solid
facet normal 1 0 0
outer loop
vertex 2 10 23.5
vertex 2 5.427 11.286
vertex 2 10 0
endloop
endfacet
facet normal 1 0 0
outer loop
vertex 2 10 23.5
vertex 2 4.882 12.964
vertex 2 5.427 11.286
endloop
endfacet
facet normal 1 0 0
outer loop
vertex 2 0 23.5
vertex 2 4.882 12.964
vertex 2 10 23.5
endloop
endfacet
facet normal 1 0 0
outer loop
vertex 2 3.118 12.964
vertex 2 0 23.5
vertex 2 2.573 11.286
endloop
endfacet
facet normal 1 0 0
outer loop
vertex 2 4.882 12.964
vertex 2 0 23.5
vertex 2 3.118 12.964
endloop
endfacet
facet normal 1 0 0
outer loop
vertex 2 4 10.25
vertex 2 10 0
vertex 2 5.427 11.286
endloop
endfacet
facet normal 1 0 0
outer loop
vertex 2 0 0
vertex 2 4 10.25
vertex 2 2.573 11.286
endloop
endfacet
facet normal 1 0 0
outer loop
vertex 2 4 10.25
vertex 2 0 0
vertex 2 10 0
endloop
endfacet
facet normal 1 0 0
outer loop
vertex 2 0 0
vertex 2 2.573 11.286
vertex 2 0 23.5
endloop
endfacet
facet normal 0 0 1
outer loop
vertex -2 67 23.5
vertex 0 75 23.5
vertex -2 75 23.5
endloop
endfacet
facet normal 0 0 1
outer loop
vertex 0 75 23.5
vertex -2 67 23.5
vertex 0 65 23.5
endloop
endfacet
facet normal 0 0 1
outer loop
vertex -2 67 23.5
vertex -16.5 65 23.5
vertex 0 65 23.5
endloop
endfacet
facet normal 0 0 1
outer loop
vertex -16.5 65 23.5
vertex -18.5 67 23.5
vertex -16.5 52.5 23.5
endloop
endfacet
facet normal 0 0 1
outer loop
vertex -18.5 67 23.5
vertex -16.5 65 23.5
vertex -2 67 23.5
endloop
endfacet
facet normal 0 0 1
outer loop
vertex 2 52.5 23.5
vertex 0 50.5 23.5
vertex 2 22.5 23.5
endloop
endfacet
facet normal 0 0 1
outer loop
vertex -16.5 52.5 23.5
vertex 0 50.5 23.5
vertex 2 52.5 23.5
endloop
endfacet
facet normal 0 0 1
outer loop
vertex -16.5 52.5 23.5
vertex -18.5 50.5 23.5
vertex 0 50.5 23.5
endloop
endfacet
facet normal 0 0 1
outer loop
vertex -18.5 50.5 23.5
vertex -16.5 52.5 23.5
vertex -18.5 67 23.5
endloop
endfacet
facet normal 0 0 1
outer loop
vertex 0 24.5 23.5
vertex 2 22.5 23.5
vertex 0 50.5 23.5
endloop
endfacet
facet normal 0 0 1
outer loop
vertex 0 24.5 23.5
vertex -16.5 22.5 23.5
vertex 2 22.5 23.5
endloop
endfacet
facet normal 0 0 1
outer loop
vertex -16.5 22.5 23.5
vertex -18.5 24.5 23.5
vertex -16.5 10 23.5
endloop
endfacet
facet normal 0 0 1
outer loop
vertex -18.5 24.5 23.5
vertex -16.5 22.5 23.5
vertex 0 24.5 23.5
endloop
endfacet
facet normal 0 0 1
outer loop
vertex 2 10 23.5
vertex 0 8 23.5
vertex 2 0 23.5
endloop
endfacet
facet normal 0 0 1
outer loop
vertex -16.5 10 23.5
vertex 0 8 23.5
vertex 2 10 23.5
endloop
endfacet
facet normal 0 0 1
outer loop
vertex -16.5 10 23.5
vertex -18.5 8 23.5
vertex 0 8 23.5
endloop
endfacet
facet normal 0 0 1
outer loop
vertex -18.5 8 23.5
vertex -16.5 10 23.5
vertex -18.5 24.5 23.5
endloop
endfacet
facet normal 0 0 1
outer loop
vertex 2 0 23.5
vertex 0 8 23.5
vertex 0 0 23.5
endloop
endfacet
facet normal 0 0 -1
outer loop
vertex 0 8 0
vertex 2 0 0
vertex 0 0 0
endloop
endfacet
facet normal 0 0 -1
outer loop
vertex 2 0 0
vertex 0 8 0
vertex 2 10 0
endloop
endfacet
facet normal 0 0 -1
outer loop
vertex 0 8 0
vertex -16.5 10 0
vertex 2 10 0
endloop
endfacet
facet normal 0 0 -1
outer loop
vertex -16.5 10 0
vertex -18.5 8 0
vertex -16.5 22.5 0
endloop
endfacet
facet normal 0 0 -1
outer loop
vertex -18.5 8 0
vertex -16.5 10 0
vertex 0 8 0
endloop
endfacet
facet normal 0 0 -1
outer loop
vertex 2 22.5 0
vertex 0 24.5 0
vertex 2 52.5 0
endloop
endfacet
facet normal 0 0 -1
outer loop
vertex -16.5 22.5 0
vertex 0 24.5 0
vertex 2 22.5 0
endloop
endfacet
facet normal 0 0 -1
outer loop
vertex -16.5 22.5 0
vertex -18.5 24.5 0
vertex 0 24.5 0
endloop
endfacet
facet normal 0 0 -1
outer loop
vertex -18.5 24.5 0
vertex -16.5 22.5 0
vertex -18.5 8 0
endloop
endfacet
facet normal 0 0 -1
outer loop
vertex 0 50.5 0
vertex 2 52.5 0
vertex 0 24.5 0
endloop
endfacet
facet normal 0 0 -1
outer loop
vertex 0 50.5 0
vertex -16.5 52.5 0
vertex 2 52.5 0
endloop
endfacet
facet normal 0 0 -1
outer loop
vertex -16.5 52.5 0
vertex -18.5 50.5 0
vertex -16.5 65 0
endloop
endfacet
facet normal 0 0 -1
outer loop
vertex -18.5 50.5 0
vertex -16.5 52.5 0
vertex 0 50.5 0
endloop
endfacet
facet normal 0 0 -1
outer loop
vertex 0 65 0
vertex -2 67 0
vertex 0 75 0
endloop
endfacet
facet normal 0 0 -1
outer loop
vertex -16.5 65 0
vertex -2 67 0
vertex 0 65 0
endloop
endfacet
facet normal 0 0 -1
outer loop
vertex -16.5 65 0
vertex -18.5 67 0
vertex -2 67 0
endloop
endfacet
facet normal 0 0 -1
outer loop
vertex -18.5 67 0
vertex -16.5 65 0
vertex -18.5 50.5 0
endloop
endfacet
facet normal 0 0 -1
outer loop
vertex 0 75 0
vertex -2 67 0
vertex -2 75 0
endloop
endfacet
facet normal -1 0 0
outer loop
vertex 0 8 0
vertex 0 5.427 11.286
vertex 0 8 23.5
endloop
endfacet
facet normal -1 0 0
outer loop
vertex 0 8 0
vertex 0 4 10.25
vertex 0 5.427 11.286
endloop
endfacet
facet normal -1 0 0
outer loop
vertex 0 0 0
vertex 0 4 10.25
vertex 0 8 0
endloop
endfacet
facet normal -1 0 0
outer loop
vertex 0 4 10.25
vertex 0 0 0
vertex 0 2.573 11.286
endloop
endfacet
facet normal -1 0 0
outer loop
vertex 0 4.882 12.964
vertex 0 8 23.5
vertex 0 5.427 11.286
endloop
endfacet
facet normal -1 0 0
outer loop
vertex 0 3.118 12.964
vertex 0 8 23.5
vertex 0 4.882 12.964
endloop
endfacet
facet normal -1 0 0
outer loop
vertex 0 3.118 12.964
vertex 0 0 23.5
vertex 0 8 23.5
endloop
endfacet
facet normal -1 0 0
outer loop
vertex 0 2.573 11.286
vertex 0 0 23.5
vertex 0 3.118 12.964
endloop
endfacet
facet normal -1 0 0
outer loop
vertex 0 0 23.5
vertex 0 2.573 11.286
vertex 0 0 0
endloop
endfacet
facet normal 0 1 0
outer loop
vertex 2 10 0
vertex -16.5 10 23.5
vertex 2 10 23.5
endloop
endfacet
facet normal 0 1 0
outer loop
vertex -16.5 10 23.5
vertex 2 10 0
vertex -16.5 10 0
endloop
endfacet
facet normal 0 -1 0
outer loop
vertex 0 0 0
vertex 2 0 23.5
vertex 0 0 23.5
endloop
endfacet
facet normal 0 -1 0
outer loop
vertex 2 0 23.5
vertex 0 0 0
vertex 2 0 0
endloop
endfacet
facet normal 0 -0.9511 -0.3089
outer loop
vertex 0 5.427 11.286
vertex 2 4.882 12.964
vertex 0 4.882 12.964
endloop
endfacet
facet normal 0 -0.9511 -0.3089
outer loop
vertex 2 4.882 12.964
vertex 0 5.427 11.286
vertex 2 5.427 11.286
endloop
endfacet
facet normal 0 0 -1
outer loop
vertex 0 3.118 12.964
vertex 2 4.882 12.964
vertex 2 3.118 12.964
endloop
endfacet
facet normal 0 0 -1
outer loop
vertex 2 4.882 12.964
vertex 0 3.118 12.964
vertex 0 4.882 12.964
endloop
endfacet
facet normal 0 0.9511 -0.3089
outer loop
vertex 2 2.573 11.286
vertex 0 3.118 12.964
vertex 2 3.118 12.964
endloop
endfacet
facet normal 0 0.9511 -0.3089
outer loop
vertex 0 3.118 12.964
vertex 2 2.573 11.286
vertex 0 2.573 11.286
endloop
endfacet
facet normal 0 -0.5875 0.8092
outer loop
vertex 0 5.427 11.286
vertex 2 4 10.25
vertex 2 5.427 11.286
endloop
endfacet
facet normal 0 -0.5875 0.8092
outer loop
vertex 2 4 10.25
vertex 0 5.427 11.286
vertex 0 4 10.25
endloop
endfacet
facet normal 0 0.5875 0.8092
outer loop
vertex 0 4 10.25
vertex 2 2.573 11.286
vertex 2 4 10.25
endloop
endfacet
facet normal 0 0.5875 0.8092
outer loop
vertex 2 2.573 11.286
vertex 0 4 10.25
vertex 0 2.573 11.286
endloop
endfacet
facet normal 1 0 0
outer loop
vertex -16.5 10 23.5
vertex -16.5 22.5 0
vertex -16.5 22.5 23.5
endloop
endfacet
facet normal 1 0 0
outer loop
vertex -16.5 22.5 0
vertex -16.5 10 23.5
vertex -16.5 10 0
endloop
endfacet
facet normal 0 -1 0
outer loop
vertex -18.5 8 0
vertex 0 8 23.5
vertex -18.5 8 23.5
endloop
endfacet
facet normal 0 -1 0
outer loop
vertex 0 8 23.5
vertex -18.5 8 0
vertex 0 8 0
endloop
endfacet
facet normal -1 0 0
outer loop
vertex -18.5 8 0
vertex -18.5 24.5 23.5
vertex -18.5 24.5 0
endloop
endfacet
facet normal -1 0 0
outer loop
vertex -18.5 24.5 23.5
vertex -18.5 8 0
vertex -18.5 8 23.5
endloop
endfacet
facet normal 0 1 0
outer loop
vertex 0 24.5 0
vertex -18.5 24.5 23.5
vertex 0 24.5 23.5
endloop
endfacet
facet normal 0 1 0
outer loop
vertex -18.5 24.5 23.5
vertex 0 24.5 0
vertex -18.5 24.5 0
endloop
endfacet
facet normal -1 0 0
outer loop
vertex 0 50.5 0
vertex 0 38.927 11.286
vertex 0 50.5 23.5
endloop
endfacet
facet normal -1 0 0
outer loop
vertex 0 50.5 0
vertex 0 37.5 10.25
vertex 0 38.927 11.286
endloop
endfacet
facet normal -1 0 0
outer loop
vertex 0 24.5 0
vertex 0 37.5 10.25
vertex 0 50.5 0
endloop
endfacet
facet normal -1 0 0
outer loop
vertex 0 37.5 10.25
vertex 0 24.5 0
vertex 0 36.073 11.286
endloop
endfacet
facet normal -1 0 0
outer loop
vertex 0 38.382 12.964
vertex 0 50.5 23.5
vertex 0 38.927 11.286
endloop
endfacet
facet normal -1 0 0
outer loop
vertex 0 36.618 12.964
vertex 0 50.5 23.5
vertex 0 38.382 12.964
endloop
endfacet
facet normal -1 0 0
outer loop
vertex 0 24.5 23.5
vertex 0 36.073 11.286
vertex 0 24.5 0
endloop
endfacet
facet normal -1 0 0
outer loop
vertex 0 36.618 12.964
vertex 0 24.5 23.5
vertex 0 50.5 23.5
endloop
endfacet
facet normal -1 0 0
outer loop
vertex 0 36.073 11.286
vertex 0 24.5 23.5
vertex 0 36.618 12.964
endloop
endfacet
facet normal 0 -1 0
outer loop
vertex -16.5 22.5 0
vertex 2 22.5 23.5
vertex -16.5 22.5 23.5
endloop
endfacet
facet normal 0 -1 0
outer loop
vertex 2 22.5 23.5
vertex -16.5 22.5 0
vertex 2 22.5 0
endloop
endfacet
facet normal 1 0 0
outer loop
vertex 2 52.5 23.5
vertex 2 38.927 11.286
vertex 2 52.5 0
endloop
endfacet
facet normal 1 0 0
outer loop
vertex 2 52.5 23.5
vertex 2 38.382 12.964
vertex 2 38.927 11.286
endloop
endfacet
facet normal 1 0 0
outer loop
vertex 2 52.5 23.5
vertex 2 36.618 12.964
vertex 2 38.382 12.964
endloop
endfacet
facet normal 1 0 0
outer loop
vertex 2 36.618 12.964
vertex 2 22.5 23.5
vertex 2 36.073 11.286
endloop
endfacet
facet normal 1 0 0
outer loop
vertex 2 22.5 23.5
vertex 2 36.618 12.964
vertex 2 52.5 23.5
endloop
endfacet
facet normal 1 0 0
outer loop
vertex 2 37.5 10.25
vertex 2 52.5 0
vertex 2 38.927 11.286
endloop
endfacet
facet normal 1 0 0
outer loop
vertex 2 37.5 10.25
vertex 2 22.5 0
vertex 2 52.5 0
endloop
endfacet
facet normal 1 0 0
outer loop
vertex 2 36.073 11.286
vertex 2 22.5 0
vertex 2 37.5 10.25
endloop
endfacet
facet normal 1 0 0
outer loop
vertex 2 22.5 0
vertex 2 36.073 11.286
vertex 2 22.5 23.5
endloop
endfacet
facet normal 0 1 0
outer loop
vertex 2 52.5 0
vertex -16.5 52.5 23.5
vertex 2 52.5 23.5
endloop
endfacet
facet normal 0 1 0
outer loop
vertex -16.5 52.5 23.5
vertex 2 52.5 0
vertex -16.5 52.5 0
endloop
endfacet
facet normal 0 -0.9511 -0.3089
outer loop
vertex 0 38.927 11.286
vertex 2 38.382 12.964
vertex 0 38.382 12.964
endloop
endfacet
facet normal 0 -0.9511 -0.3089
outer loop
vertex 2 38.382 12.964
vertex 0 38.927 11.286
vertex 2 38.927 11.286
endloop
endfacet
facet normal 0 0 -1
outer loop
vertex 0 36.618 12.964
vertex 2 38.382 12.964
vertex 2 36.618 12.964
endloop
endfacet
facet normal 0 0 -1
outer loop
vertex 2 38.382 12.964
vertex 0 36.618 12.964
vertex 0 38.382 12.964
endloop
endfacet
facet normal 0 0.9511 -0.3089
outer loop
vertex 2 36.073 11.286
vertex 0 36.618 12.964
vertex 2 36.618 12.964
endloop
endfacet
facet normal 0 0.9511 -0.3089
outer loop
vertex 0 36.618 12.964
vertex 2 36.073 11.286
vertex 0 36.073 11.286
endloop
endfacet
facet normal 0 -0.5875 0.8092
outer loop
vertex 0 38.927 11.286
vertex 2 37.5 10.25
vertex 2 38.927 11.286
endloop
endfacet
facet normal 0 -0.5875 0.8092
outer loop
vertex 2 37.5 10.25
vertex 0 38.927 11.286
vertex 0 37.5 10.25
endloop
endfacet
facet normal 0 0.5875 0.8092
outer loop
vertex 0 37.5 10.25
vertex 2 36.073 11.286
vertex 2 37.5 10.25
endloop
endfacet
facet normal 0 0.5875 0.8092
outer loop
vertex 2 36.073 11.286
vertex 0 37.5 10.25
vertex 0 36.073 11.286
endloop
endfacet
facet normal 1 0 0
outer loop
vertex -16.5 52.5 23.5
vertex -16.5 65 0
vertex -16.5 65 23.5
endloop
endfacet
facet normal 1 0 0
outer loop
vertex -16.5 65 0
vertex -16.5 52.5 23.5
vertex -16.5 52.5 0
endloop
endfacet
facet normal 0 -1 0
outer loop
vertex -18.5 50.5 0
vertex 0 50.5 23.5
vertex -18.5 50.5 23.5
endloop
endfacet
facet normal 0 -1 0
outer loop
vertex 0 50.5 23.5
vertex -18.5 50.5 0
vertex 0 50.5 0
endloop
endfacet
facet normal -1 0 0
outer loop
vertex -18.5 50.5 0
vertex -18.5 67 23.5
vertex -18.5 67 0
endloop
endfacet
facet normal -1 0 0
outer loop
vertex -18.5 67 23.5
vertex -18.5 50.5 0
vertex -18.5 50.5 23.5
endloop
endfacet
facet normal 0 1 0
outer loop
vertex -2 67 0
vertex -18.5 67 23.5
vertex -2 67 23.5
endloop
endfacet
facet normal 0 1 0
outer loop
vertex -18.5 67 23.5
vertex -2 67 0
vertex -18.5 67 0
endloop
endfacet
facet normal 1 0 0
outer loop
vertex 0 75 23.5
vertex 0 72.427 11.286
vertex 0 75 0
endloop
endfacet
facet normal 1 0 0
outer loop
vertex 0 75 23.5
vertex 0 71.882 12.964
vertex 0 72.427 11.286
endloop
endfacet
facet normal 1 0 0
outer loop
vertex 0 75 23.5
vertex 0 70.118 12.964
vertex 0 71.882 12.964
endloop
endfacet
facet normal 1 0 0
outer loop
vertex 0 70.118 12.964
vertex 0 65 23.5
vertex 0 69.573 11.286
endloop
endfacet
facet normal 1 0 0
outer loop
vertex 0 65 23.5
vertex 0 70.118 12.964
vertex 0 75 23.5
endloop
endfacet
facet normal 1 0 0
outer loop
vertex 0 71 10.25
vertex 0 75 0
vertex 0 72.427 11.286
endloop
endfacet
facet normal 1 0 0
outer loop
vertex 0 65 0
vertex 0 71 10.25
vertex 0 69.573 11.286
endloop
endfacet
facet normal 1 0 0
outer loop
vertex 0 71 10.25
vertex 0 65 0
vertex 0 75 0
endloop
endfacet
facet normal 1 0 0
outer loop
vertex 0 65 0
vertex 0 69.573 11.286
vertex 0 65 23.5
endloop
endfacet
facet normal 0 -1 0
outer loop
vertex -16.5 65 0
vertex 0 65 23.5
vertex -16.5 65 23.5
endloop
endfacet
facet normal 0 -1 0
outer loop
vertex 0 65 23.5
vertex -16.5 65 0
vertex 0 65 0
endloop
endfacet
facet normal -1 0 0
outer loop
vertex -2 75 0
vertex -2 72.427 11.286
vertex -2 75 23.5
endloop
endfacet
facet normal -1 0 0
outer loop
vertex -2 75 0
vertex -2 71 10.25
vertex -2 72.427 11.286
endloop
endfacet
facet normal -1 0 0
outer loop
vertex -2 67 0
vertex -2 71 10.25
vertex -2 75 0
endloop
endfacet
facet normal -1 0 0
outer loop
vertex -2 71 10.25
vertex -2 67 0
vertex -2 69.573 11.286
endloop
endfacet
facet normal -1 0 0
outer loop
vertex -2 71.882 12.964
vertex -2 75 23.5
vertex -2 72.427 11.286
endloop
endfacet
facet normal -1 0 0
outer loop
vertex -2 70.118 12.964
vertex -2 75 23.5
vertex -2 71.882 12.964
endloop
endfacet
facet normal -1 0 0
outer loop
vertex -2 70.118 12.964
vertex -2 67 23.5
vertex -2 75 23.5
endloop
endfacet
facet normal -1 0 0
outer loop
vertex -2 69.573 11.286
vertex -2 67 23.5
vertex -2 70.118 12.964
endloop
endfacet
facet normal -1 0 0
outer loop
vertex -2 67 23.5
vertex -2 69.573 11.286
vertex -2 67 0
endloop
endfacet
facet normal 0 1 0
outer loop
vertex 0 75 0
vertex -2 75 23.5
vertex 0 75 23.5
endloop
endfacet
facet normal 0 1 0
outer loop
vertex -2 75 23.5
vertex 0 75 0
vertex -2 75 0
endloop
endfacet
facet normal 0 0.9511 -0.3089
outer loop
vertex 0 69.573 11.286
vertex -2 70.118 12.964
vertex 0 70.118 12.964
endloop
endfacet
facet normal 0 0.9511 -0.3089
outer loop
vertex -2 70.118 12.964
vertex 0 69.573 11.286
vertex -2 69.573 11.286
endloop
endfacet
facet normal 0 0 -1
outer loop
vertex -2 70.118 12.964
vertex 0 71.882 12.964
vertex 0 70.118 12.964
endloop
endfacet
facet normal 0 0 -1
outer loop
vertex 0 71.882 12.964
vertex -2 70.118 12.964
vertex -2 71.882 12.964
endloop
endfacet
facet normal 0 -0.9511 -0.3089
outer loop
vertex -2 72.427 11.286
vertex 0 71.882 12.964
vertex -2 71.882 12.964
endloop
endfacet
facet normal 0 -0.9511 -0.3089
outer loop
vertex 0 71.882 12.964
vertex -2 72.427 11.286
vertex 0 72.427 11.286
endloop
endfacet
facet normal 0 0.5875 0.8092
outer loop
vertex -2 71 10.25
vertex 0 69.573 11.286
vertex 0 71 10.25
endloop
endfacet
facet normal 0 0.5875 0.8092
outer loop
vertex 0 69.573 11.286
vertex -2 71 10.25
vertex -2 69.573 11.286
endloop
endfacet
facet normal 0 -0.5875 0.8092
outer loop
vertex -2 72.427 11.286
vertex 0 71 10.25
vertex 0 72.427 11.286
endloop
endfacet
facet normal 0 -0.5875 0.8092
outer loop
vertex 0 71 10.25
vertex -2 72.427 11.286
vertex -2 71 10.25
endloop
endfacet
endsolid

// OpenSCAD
//ServoBrace

//variables
xFrontSide = 2;
yFrontSide = 10;
zFrontSide = 23.5;

xFrontCenter = 2;
yFrontCenter = 30;
zFrontCenter = 23.5;

xBackSide = 16.5;
yBackSide = 2;
zBackSide = 23.5;

xBack = 2;
yBack = 16.5;
zBack = 23.5;

holeD = 3;
holeH = 100;

//modules
module FrontSide(){
    difference(){
        cube([xFrontSide, yFrontSide, zFrontSide]);
        translate([xFrontSide,(yFrontSide-yBackSide)/2,zFrontSide/2])
            rotate([0,90,0])
                cylinder(h=holeH, d=holeD, center=true);
    }
}

module FrontCenter(){
    difference(){
        cube([xFrontCenter, yFrontCenter, zFrontCenter]);
        translate([xFrontCenter,yFrontCenter/2,zFrontSide/2]){
            rotate([0,90,0])
                cylinder(h=holeH, d=holeD, center=true);
        }
    }
}

module BackSide(){
    cube([xBackSide, yBackSide, zBackSide]);
}

module Back(){
    cube([xBack, yBack, zBack]);
}

module RealBack(){
    BackSide();
    translate([-xBack,0,0])
        Back();
    translate([0,yBack-yBackSide,0])
        BackSide();
}

module servoBrace(){
    union(){
        FrontSide();
        translate([-xBackSide,yFrontSide-yBackSide,0])
        RealBack();
        translate([0,yFrontSide+yBack-2*yBackSide,0])
            FrontCenter();
        translate([-xBackSide,yFrontSide+yFrontCenter+yBack-3*yBackSide,0])
            RealBack();
        translate([0,2*yFrontSide+yFrontCenter+2*yBack-4*yBackSide,0])
            rotate([0,0,180])
            FrontSide();
    }
}

servoBrace();
